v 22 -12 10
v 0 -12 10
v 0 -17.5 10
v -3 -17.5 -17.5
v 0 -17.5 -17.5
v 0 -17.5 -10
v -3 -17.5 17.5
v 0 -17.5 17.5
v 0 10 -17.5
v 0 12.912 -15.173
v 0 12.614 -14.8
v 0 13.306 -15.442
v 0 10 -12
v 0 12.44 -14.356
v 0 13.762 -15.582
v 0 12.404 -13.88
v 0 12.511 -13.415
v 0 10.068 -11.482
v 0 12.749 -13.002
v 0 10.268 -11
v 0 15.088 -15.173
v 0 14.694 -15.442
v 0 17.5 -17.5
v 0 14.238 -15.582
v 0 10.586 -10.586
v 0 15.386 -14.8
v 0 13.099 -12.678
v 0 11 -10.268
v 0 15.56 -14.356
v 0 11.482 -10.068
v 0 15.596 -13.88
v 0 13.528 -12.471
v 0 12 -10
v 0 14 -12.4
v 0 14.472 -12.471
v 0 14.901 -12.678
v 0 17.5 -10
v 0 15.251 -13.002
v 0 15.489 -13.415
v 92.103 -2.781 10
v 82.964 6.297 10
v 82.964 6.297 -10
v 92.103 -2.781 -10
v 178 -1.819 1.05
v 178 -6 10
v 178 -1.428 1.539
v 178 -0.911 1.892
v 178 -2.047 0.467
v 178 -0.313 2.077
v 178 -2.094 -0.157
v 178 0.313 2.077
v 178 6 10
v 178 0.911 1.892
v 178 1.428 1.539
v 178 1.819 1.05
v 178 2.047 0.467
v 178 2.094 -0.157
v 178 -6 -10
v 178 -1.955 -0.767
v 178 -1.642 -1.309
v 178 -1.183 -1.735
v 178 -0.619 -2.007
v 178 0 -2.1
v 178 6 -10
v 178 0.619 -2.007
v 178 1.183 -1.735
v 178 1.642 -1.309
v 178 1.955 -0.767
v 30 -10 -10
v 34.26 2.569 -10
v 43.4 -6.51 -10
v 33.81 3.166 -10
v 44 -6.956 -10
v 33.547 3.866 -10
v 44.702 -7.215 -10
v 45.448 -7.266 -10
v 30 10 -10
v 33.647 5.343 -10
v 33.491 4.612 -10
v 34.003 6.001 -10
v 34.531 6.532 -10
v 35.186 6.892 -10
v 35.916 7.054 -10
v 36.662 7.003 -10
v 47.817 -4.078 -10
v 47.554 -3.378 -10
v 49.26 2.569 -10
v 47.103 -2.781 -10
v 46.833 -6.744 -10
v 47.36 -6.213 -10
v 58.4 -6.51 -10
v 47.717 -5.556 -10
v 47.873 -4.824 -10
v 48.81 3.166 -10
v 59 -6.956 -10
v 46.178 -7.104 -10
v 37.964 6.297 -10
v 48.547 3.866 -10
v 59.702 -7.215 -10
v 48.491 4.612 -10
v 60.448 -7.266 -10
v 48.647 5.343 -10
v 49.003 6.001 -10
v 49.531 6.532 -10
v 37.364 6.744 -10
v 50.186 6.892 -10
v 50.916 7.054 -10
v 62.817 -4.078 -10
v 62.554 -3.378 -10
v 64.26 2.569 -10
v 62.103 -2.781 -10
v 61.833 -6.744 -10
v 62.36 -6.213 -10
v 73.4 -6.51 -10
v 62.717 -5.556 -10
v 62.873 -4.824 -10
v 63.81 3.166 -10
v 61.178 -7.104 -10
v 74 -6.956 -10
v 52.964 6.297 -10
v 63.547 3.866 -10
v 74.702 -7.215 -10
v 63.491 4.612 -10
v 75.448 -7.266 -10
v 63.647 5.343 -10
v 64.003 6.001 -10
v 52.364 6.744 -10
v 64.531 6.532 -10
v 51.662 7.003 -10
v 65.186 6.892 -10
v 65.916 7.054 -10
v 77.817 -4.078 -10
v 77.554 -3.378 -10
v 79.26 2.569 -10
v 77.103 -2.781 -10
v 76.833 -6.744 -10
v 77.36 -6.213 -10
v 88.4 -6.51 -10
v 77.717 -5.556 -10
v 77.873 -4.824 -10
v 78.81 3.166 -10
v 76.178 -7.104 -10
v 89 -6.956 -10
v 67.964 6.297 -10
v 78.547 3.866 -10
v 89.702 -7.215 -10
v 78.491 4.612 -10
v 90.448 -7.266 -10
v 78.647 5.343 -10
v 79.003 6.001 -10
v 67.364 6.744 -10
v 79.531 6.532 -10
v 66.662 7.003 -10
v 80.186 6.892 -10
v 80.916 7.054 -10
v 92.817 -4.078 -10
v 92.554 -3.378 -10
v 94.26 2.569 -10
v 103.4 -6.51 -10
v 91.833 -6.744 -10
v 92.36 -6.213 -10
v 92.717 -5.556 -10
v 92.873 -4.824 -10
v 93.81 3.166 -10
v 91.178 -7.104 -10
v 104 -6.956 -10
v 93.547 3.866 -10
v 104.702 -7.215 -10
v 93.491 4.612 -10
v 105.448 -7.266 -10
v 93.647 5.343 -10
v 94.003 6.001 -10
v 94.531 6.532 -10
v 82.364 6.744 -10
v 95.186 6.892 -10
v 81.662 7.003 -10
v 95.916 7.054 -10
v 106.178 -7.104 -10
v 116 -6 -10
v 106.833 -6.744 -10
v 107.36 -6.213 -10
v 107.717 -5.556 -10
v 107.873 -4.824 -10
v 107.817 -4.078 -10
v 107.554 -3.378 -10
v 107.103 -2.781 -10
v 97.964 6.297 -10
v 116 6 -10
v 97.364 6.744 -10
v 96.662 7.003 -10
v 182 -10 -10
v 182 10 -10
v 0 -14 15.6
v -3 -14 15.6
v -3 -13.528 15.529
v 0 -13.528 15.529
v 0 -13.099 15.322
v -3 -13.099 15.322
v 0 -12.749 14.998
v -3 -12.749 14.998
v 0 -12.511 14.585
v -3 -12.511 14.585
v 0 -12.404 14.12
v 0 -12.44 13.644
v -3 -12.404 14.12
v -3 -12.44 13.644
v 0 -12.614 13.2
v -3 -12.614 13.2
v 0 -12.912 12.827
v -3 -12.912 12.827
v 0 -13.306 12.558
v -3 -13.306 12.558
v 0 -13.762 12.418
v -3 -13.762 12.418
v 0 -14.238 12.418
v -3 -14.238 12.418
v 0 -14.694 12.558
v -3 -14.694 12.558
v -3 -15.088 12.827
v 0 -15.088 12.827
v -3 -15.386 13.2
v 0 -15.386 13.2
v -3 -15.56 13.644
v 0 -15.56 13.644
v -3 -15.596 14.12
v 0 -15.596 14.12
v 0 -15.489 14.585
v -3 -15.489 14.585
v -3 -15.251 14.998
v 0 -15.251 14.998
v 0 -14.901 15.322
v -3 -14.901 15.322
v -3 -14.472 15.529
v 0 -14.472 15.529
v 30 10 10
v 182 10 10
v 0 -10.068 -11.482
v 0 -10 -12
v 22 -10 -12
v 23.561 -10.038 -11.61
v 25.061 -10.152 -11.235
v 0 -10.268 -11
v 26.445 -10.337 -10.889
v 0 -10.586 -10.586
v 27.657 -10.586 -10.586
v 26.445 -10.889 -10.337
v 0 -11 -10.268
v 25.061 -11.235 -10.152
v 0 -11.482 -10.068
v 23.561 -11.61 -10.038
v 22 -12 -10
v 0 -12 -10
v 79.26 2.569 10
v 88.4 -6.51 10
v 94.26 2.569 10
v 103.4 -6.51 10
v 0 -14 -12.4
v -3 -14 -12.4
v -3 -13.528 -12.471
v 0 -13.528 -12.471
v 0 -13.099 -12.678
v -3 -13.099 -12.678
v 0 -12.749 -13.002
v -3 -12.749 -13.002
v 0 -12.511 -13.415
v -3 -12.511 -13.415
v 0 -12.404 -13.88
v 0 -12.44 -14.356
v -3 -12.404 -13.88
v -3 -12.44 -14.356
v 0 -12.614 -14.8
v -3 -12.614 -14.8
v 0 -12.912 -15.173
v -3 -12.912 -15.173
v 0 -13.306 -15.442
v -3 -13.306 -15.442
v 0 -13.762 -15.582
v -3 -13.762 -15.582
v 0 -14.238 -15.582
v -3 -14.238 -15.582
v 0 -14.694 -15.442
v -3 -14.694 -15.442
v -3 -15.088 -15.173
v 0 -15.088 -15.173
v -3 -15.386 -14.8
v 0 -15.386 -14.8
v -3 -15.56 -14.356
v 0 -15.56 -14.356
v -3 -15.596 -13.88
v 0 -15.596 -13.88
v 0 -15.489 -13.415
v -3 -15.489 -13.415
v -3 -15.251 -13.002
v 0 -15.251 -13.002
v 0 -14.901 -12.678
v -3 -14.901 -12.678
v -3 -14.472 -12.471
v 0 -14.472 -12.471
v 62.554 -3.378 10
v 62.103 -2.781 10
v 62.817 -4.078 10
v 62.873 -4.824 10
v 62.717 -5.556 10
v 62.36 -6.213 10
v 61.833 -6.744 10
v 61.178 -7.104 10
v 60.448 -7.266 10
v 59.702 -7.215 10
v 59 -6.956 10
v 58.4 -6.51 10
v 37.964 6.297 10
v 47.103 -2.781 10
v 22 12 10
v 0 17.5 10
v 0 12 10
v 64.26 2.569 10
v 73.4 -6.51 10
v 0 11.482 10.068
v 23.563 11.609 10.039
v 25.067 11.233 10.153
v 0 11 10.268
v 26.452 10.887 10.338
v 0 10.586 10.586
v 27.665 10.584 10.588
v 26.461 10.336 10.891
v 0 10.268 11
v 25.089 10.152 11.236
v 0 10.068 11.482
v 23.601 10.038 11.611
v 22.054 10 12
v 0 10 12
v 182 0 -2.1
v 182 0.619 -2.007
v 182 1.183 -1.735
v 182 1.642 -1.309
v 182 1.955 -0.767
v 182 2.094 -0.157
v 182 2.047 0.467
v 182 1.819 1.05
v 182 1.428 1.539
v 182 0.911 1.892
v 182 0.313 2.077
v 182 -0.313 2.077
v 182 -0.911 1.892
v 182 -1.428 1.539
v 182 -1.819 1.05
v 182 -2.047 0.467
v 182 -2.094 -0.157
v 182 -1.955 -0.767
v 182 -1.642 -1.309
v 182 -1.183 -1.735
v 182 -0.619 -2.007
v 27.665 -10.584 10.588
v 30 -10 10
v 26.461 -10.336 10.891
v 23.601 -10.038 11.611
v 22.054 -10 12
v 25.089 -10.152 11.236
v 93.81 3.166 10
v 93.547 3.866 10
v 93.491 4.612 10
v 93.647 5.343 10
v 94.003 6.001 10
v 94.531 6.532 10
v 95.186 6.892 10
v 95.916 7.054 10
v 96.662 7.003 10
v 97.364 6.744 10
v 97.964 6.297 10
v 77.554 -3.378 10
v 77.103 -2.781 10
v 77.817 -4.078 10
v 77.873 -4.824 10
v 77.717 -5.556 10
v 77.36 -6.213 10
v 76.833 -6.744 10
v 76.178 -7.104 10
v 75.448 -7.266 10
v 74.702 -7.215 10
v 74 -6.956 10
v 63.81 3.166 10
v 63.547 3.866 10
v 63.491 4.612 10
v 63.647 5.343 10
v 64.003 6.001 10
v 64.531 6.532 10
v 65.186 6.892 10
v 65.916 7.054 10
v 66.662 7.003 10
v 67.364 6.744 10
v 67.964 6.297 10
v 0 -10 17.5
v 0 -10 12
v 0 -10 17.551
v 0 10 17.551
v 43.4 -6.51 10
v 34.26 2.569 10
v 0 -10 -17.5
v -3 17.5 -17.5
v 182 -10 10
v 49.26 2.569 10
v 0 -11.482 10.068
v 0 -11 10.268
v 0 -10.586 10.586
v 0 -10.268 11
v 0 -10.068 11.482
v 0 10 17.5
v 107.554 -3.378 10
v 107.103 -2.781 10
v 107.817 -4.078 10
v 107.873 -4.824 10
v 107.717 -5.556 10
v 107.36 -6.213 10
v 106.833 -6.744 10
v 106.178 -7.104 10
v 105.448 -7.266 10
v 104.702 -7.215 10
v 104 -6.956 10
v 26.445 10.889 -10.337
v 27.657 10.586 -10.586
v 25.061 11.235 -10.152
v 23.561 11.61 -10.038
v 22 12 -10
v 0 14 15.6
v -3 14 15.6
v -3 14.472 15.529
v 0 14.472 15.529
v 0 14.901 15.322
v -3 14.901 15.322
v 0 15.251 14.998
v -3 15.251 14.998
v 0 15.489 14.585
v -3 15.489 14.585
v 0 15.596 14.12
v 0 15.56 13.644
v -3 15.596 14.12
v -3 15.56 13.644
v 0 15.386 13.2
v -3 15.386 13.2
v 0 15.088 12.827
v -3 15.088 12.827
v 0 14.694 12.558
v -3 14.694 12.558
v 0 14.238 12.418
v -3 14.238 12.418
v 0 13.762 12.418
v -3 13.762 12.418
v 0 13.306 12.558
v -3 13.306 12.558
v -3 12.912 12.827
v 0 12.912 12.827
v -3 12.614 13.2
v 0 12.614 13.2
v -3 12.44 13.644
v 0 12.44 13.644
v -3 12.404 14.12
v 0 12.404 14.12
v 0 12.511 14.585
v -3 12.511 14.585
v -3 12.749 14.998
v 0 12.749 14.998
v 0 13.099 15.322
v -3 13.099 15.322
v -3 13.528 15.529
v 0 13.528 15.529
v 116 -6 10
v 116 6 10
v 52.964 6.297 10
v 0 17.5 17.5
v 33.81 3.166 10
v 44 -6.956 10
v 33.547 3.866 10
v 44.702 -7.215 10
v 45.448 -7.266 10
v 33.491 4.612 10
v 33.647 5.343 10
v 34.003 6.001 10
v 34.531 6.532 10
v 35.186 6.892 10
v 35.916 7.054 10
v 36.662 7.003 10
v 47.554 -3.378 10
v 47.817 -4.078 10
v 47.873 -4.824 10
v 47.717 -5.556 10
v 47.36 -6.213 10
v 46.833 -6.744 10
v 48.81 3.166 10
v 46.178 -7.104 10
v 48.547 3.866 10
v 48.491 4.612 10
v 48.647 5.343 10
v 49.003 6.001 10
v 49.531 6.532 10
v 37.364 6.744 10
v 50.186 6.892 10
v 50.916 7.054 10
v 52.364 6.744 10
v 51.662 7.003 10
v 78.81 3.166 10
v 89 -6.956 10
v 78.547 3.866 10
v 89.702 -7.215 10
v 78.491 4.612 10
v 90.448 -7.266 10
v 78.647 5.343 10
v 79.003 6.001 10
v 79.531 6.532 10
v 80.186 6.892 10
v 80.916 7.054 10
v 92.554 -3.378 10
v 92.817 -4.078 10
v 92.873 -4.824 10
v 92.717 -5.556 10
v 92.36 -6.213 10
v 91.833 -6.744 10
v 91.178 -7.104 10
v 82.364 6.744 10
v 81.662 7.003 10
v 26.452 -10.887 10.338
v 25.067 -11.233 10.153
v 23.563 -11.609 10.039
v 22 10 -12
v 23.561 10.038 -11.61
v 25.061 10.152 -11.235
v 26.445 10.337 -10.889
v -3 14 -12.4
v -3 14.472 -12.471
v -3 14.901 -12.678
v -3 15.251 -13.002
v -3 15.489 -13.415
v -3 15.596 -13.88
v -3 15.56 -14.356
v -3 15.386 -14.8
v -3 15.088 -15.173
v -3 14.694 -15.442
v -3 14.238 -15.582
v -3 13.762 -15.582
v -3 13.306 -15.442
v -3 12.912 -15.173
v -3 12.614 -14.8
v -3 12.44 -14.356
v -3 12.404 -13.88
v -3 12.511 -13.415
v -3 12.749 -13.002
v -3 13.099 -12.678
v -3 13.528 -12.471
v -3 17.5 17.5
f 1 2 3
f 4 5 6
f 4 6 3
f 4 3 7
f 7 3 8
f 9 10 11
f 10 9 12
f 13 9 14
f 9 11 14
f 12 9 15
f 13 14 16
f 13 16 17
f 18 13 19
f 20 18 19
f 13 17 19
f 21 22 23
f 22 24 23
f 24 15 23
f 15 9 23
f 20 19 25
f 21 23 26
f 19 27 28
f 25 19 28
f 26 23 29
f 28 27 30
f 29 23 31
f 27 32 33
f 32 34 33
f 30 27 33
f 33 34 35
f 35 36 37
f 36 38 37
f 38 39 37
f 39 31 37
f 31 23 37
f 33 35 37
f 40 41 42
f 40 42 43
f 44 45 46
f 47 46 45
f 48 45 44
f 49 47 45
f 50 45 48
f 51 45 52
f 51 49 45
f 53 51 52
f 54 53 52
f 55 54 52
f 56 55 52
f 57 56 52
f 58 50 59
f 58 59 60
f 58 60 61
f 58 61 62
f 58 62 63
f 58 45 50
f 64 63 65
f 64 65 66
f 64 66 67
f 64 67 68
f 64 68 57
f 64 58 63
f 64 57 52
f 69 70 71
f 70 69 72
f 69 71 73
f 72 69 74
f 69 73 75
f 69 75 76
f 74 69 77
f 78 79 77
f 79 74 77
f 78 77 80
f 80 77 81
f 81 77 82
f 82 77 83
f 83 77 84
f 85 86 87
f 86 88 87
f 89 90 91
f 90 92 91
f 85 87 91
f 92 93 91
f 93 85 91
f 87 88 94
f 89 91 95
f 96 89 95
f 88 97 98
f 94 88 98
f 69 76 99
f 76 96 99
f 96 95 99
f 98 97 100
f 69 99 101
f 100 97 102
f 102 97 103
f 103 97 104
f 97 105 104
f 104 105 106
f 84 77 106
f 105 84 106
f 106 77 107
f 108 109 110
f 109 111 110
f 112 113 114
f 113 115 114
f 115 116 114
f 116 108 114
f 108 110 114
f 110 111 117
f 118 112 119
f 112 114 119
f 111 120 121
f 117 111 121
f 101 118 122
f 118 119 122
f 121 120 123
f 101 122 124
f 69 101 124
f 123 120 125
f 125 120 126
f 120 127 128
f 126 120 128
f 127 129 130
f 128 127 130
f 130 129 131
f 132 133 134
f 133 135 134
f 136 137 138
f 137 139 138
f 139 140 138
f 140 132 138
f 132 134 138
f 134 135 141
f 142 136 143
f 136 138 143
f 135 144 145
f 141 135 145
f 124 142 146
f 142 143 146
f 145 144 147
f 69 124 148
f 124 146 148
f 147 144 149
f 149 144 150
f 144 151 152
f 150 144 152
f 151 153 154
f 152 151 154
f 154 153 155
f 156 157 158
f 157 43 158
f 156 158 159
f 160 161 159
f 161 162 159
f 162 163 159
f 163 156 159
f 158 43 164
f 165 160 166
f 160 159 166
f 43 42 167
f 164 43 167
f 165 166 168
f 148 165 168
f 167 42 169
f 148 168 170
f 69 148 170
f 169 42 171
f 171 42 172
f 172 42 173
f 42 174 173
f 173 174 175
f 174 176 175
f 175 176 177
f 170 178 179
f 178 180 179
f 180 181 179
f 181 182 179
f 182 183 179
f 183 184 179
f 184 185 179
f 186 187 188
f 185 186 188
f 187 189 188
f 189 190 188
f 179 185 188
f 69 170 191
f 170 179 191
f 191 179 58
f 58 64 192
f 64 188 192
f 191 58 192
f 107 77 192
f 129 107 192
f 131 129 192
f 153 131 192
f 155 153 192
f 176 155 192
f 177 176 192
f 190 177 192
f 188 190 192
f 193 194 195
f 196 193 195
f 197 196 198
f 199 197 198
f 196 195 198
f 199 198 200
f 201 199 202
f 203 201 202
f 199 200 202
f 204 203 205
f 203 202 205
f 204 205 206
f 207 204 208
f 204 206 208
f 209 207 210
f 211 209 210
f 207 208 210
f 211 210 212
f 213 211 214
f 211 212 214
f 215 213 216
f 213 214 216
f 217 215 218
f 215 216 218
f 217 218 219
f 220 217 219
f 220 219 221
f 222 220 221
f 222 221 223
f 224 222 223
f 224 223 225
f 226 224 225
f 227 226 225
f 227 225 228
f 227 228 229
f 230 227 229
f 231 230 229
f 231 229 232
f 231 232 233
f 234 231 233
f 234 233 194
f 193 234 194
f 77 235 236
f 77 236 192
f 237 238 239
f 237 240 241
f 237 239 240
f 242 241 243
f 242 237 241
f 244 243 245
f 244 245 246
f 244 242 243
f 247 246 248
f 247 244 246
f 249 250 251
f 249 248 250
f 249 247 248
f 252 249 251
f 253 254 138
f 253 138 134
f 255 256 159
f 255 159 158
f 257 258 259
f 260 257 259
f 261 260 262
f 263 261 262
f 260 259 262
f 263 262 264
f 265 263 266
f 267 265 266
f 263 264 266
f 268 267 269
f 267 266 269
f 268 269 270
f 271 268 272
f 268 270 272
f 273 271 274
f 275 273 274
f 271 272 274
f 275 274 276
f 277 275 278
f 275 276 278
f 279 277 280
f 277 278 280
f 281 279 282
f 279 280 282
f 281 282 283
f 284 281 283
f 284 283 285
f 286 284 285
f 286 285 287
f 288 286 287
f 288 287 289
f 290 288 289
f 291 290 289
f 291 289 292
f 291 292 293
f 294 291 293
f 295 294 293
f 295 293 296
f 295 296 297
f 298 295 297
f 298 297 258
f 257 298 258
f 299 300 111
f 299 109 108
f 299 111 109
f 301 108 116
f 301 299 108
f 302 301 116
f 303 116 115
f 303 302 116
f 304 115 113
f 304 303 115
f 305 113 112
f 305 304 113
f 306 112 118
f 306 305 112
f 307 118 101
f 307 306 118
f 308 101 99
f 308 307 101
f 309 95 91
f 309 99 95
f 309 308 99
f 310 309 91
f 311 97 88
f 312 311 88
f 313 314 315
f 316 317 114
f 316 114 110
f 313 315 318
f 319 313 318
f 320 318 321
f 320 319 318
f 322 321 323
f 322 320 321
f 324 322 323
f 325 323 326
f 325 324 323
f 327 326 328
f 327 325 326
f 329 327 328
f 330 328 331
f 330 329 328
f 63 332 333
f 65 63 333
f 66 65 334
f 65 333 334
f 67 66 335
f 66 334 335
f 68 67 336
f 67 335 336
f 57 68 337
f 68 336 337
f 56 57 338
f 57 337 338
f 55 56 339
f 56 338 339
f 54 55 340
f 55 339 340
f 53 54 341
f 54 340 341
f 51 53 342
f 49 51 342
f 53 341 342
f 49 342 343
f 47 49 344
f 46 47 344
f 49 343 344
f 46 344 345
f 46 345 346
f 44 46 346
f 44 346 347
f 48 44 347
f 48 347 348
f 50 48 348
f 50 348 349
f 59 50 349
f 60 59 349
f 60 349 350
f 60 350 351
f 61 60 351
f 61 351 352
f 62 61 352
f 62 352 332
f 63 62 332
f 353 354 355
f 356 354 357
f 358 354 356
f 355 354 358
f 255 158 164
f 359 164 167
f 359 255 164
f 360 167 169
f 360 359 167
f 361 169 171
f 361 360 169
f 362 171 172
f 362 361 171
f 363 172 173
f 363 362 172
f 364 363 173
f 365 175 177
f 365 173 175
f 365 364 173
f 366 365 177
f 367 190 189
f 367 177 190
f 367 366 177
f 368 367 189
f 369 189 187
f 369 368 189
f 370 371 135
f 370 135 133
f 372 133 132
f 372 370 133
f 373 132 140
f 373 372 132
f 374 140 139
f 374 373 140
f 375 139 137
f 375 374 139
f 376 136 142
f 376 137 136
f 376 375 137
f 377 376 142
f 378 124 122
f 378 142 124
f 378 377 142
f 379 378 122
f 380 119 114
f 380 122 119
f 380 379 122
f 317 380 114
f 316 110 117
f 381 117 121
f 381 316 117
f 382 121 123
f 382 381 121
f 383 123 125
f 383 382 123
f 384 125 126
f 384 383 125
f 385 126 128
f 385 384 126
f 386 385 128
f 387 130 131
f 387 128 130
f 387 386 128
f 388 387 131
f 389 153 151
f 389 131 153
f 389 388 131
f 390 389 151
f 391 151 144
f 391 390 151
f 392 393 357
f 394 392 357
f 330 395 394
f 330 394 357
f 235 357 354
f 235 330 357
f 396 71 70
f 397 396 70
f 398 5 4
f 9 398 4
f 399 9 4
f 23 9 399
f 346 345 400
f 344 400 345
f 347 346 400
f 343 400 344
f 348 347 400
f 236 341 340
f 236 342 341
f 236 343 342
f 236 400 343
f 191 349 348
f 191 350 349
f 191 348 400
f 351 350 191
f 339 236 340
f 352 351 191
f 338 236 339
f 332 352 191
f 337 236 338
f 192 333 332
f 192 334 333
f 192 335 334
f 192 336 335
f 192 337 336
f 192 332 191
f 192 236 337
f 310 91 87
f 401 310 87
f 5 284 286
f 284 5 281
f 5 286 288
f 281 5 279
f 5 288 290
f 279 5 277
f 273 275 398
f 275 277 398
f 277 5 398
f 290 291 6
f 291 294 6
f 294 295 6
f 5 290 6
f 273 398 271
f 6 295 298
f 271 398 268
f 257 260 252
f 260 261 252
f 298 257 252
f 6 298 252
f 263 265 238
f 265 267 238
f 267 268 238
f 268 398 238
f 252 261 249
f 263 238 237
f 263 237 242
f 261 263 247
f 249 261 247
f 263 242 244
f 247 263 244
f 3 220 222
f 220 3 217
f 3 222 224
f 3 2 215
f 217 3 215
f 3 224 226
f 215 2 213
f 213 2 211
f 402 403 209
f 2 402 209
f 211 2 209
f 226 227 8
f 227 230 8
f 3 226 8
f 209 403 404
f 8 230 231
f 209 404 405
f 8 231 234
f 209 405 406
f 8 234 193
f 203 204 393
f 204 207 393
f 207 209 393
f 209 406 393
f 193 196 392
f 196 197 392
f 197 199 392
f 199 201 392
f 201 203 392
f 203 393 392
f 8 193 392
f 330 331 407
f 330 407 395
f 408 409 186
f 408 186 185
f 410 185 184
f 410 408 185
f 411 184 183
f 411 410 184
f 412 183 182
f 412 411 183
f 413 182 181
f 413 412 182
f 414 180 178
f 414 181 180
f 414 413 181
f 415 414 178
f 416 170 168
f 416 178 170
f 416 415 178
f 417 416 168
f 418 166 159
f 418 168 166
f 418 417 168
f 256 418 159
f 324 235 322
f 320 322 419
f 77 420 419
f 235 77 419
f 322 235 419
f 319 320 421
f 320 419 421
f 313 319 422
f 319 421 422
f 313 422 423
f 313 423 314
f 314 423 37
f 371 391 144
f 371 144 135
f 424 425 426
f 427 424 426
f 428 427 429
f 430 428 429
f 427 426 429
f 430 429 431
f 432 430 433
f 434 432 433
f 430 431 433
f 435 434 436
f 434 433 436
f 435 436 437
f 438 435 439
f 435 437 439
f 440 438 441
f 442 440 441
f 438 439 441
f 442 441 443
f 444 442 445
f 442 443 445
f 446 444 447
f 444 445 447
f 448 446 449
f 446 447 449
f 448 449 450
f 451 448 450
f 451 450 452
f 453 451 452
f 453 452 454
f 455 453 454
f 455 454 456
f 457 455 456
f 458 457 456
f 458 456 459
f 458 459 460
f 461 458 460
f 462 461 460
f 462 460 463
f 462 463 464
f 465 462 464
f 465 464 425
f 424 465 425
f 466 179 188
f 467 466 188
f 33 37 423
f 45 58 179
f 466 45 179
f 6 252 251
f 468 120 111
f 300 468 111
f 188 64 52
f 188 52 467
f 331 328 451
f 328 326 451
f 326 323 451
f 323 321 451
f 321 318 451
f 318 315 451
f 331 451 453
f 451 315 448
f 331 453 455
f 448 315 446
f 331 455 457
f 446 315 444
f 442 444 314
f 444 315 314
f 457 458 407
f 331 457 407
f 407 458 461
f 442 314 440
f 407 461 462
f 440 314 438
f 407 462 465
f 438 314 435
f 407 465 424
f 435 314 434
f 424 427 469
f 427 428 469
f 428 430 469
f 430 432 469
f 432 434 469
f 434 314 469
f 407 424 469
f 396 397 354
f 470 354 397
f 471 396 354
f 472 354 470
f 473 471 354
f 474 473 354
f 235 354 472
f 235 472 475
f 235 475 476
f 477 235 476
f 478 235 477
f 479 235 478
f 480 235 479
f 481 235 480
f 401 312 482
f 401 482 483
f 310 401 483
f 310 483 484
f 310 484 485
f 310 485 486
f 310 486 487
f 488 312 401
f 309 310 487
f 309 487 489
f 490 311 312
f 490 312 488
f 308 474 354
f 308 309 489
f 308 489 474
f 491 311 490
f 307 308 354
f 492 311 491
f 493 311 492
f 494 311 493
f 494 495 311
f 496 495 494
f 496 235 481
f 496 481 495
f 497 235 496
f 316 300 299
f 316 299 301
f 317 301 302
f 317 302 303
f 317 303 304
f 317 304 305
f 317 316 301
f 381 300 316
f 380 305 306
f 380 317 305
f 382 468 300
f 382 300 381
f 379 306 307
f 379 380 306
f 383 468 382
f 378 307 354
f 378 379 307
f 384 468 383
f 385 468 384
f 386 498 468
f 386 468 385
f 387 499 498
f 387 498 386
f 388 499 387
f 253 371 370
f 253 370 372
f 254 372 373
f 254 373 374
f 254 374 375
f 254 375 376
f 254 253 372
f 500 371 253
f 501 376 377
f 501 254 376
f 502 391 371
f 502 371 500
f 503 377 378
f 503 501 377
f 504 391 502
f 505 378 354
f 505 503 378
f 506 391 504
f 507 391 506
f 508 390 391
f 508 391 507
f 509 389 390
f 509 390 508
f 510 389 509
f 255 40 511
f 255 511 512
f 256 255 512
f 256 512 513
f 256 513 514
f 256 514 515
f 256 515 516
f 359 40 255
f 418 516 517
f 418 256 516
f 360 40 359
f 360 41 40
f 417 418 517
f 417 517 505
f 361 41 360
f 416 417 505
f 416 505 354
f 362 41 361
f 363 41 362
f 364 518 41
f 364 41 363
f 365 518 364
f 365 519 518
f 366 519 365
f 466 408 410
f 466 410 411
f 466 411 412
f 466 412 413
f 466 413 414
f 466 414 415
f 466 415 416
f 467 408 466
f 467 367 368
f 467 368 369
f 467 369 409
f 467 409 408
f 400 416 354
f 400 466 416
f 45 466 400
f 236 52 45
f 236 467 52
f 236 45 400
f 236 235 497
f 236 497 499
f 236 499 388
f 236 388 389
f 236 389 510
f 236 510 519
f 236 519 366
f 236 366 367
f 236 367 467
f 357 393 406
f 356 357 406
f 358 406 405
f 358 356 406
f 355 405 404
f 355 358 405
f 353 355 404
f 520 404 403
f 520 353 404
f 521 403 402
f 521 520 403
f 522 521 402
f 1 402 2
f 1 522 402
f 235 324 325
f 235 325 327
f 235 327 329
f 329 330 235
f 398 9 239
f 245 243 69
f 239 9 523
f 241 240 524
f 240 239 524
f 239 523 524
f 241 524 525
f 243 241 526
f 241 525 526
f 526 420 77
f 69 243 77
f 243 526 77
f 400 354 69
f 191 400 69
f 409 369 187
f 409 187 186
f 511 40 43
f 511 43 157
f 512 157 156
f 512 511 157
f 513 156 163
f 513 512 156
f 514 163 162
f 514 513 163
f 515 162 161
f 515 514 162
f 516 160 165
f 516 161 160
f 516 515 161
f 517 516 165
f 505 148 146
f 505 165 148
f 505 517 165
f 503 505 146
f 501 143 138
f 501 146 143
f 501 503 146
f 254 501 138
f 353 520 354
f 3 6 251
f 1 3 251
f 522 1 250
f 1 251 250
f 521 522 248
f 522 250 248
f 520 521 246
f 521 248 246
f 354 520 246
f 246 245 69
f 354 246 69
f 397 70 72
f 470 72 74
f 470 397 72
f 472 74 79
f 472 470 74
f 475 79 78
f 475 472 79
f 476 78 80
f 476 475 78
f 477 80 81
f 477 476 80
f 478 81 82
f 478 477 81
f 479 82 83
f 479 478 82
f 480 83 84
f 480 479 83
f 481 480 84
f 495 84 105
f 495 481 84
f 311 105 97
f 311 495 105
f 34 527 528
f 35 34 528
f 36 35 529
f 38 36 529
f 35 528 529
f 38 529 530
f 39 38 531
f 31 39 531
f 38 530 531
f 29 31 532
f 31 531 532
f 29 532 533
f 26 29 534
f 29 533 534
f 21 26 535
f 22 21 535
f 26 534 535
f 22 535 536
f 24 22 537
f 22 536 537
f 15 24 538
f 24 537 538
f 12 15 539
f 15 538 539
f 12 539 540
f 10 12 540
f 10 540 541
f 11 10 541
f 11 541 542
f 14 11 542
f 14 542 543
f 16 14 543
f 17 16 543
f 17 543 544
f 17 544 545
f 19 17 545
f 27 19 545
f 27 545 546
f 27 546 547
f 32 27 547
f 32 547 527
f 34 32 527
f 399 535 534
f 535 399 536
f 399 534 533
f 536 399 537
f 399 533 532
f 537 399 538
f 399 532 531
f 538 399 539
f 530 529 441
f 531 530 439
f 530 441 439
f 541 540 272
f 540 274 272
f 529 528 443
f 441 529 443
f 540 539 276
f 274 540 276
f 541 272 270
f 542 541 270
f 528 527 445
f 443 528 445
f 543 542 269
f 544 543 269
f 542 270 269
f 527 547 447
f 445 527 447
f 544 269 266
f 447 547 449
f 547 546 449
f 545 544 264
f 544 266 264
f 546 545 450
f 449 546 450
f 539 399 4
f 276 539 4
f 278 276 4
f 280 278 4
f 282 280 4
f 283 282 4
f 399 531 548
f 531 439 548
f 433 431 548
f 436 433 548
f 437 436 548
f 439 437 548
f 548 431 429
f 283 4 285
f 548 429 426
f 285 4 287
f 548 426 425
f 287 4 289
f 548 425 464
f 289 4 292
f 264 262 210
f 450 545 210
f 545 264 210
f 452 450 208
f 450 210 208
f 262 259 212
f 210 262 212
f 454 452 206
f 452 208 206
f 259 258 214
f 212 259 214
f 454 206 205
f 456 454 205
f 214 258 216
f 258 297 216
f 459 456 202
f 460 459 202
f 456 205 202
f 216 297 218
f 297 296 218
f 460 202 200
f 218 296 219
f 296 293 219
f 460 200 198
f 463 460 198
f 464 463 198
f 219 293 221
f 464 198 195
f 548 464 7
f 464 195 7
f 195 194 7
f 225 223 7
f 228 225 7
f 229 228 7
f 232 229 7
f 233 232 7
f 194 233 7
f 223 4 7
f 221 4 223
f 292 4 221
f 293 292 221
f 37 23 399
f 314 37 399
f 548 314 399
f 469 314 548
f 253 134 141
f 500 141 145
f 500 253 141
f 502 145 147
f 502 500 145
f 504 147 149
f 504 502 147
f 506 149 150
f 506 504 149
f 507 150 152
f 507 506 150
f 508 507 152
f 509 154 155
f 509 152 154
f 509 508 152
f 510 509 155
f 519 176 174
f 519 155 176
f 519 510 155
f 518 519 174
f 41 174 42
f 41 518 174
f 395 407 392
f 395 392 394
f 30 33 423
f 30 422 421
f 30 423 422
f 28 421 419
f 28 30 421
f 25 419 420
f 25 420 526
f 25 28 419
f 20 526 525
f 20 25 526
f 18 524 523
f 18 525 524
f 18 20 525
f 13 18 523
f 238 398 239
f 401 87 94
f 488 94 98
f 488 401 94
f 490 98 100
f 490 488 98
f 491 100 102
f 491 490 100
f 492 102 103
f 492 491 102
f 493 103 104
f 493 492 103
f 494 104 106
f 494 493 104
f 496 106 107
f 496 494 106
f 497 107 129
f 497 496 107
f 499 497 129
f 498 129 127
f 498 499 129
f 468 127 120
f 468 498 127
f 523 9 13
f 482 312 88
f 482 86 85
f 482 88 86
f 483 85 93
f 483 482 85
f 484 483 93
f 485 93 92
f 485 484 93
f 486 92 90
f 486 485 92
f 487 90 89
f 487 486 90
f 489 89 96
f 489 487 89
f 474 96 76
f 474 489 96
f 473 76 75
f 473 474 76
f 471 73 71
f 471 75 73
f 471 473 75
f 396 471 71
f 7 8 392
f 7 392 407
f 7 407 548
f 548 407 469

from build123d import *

# Parameters (mm, degrees)
SKETCH_1_W          = 20
SKETCH_1_H          = 20
EXTRUDE_1_DEPTH     = 182
SKETCH_3_W          = 35
SKETCH_3_H          = 35
EXTRUDE_2_DEPTH     = 3
SKETCH_4_R          = 2.1
CUT_EXTRUDE_2_DEPTH = 23
CUT_EXTRUDE_3_REACH = 188.648
SKETCH_5_R          = 1.6
EXTRUDE_3_DEPTH     = 20
EXTRUDE_4_DEPTH     = 20
FILLET_1_R          = 2
CUT_EXTRUDE_4_REACH = 186.903
SKETCH_8_W          = 62
SKETCH_8_H          = 12
CUT_EXTRUDE_6_REACH = 186.896


with BuildPart() as part:
    # 草图1 → 凸台-拉伸1 (new body)
    with BuildSketch(Plane(origin=(0, 0, 0), x_dir=(0, 0, -1), z_dir=(1, 0, 0))):
        Rectangle(SKETCH_1_W, SKETCH_1_H)
    extrude(amount=EXTRUDE_1_DEPTH)

    # 草图3 → 凸台-拉伸2 (add)
    with BuildSketch(Plane.ZY):
        Rectangle(SKETCH_3_W, SKETCH_3_H)
    extrude(amount=EXTRUDE_2_DEPTH)

    # 草图4 → 切除-拉伸2 (cut)
    with BuildSketch(Plane(origin=(182, 0, 0), x_dir=(0, 0, -1), z_dir=(1, 0, 0))):
        Circle(SKETCH_4_R)
    extrude(amount=-CUT_EXTRUDE_2_DEPTH, mode=Mode.SUBTRACT)

    # 草图5 → 切除-拉伸3 (cut, up to next)
    with BuildSketch(Plane.ZY.offset(3), mode=Mode.PRIVATE) as cut_extrude_3_sk1:
        with Locations((-14, 14)):
            Circle(SKETCH_5_R)
    cut_extrude_3_tool1 = extrude(cut_extrude_3_sk1.sketch, amount=-CUT_EXTRUDE_3_REACH, mode=Mode.PRIVATE) & part.part
    # 草图5 → 切除-拉伸3 (cut, up to next)
    with BuildSketch(Plane.ZY.offset(3), mode=Mode.PRIVATE) as cut_extrude_3_sk2:
        with Locations((14, 14)):
            Circle(SKETCH_5_R)
    cut_extrude_3_tool2 = extrude(cut_extrude_3_sk2.sketch, amount=-CUT_EXTRUDE_3_REACH, mode=Mode.PRIVATE) & part.part
    # 草图5 → 切除-拉伸3 (cut, up to next)
    with BuildSketch(Plane.ZY.offset(3), mode=Mode.PRIVATE) as cut_extrude_3_sk3:
        with Locations((-14, -14)):
            Circle(SKETCH_5_R)
    cut_extrude_3_tool3 = extrude(cut_extrude_3_sk3.sketch, amount=-CUT_EXTRUDE_3_REACH, mode=Mode.PRIVATE) & part.part
    # 草图5 → 切除-拉伸3 (cut, up to next)
    with BuildSketch(Plane.ZY.offset(3), mode=Mode.PRIVATE) as cut_extrude_3_sk4:
        with Locations((14, -14)):
            Circle(SKETCH_5_R)
    cut_extrude_3_tool4 = extrude(cut_extrude_3_sk4.sketch, amount=-CUT_EXTRUDE_3_REACH, mode=Mode.PRIVATE) & part.part
    add(cut_extrude_3_tool1.solids().sort_by_distance((-3, 14, -14))[0], mode=Mode.SUBTRACT)
    add(cut_extrude_3_tool2.solids().sort_by_distance((-3, 14, 14))[0], mode=Mode.SUBTRACT)
    add(cut_extrude_3_tool3.solids().sort_by_distance((-3, -14, -14))[0], mode=Mode.SUBTRACT)
    add(cut_extrude_3_tool4.solids().sort_by_distance((-3, -14, 14))[0], mode=Mode.SUBTRACT)

    # 草图6 → 凸台-拉伸3 (add)
    with BuildSketch(Plane(origin=(0, 0, -10), x_dir=(-1, 0, 0), z_dir=(0, 0, -1))):
        Polygon((-30, 10), (0, 17.5), (0, 10), align=None)
        Polygon((0, -10), (-30, -10), (0, -17.5), align=None)
    extrude(amount=-EXTRUDE_3_DEPTH)

    # 草图7 → 凸台-拉伸4 (add)
    with BuildSketch(Plane(origin=(0, 10, 0), x_dir=(1, 0, 0), z_dir=(0, 1, 0))):
        Polygon((0, 10), (30, 10), (0, 17.5), align=None)
        Polygon((30, -10), (0, -10), (0, -17.550639808), align=None)
    extrude(amount=-EXTRUDE_4_DEPTH)

    # 圆角1
    # the kernel refuses this fillet: 2 mm, written as the material it adds along each edge
    with BuildSketch(Plane(origin=(-5, 10, -10), x_dir=(0, 0, -1), z_dir=(1, 0, 0))) as fillet_1_piece_1_section:
        with BuildLine():
            CenterArc((FILLET_1_R, FILLET_1_R), FILLET_1_R, 180, 90)
            Line((0, FILLET_1_R), (0, 0))
            Line((0, 0), (FILLET_1_R, 0))
        make_face()
    fillet_1_piece_1 = extrude(amount=40, mode=Mode.PRIVATE)
    fillet_1_piece_1 = split(fillet_1_piece_1, bisect_by=Plane(origin=(14.470095562, 13.882476109, -10.438694278), z_dir=(-0.24253562503633314, -0.9701425001453319, 0)), keep=Keep.TOP, mode=Mode.PRIVATE)
    fillet_1_piece_1 = split(fillet_1_piece_1, bisect_by=Plane(origin=(-3, 10.438694278, -10.438694278), z_dir=(1, 0, 0)), keep=Keep.TOP, mode=Mode.PRIVATE)
    fillet_1_piece_1 = split(fillet_1_piece_1, bisect_by=Plane(origin=(14.470095562, 10.438694278, -13.882476109), z_dir=(-0.24253562503633308, 0, 0.9701425001453319)), keep=Keep.TOP, mode=Mode.PRIVATE)
    add(fillet_1_piece_1)
    with BuildSketch(Plane(origin=(0, -10, -10), x_dir=(0, -1, 0), z_dir=(1, 0, 0))) as fillet_1_piece_2_section:
        with BuildLine():
            CenterArc((FILLET_1_R, FILLET_1_R), FILLET_1_R, 180, 90)
            Line((0, FILLET_1_R), (0, 0))
            Line((0, 0), (FILLET_1_R, 0))
        make_face()
    fillet_1_piece_2 = extrude(amount=35, mode=Mode.PRIVATE)
    fillet_1_piece_2 = split(fillet_1_piece_2, bisect_by=Plane(origin=(14.470095562, -10.438694278, -13.882476109), z_dir=(-0.24253562503633308, 0, 0.9701425001453319)), keep=Keep.TOP, mode=Mode.PRIVATE)
    fillet_1_piece_2 = split(fillet_1_piece_2, bisect_by=Plane(origin=(14.470095562, -13.882476109, -10.438694278), z_dir=(-0.24253562503633314, 0.9701425001453319, 0)), keep=Keep.TOP, mode=Mode.PRIVATE)
    add(fillet_1_piece_2)
    with BuildSketch(Plane(origin=(35, 10, 10), x_dir=(0, 1, 0), z_dir=(-1, 0, 0))) as fillet_1_piece_3_section:
        with BuildLine():
            CenterArc((FILLET_1_R, -FILLET_1_R), FILLET_1_R, 90, 90)
            Line((0, -FILLET_1_R), (0, 0))
            Line((0, 0), (FILLET_1_R, 0))
        make_face()
    fillet_1_piece_3 = extrude(amount=40, mode=Mode.PRIVATE)
    fillet_1_piece_3 = split(fillet_1_piece_3, bisect_by=Plane(origin=(14.474382617, 13.881404346, 10.438850692), z_dir=(-0.24253562503633314, -0.9701425001453319, 0)), keep=Keep.TOP, mode=Mode.PRIVATE)
    fillet_1_piece_3 = split(fillet_1_piece_3, bisect_by=Plane(origin=(-3, 10.438597443, 10.438850692), z_dir=(1, 0, 0)), keep=Keep.TOP, mode=Mode.PRIVATE)
    fillet_1_piece_3 = split(fillet_1_piece_3, bisect_by=Plane(origin=(14.485990983, 10.438597443, 13.904689802), z_dir=(-0.24407597060240918, 0, -0.969756113966028)), keep=Keep.TOP, mode=Mode.PRIVATE)
    add(fillet_1_piece_3)
    with BuildSketch(Plane(origin=(35, -10, 10), x_dir=(0, 0, 1), z_dir=(-1, 0, 0))) as fillet_1_piece_4_section:
        with BuildLine():
            CenterArc((FILLET_1_R, -FILLET_1_R), FILLET_1_R, 90, 90)
            Line((0, -FILLET_1_R), (0, 0))
            Line((0, 0), (FILLET_1_R, 0))
        make_face()
    fillet_1_piece_4 = extrude(amount=35, mode=Mode.PRIVATE)
    fillet_1_piece_4 = split(fillet_1_piece_4, bisect_by=Plane(origin=(14.474382617, -13.881404346, 10.438850692), z_dir=(-0.24253562503633314, 0.9701425001453319, 0)), keep=Keep.TOP, mode=Mode.PRIVATE)
    fillet_1_piece_4 = split(fillet_1_piece_4, bisect_by=Plane(origin=(14.485990983, -10.438597443, 13.904689802), z_dir=(-0.24407597060240918, 0, -0.969756113966028)), keep=Keep.TOP, mode=Mode.PRIVATE)
    add(fillet_1_piece_4)

    # 草图8 → 切除-拉伸4 (cut, up to next)
    with BuildSketch(Plane(origin=(0, 0, -10), x_dir=(-1, 0, 0), z_dir=(0, 0, -1)), mode=Mode.PRIVATE) as cut_extrude_4_sk1:
        with Locations((-147, 0)):
            Rectangle(SKETCH_8_W, SKETCH_8_H)
    cut_extrude_4_tool1 = extrude(cut_extrude_4_sk1.sketch, amount=-CUT_EXTRUDE_4_REACH, mode=Mode.PRIVATE) & part.part
    add(cut_extrude_4_tool1.solids().sort_by_distance((147, 0, -10))[0], mode=Mode.SUBTRACT)

    # 草图9 → 切除-拉伸6 (cut, up to next)
    with BuildSketch(Plane.XY.offset(10), mode=Mode.PRIVATE) as cut_extrude_6_sk1:
        with BuildLine():
            Line((97.964235065, 6.297490727), (107.103469291, -2.781172596))
            ThreePointArc((107.103469291, -2.781172596), (107.115824812, -6.497340056), (103.399657352, -6.509695577))
            Line((103.399657352, -6.509695577), (94.260423126, 2.568967746))
            ThreePointArc((94.260423126, 2.568967746), (94.248067605, 6.285135206), (97.964235065, 6.297490727))
        make_face()
    cut_extrude_6_tool1 = extrude(cut_extrude_6_sk1.sketch, amount=-CUT_EXTRUDE_6_REACH, mode=Mode.PRIVATE) & part.part
    # 草图9 → 切除-拉伸6 (cut, up to next)
    with BuildSketch(Plane.XY.offset(10), mode=Mode.PRIVATE) as cut_extrude_6_sk2:
        with BuildLine():
            Line((82.964235065, 6.297490727), (92.103469291, -2.781172596))
            ThreePointArc((92.103469291, -2.781172596), (92.115824812, -6.497340056), (88.399657352, -6.509695577))
            Line((88.399657352, -6.509695577), (79.260423126, 2.568967746))
            ThreePointArc((79.260423126, 2.568967746), (79.248067605, 6.285135206), (82.964235065, 6.297490727))
        make_face()
    cut_extrude_6_tool2 = extrude(cut_extrude_6_sk2.sketch, amount=-CUT_EXTRUDE_6_REACH, mode=Mode.PRIVATE) & part.part
    # 草图9 → 切除-拉伸6 (cut, up to next)
    with BuildSketch(Plane.XY.offset(10), mode=Mode.PRIVATE) as cut_extrude_6_sk3:
        with BuildLine():
            Line((67.964235065, 6.297490727), (77.103469291, -2.781172596))
            ThreePointArc((77.103469291, -2.781172596), (77.115824812, -6.497340056), (73.399657352, -6.509695577))
            Line((73.399657352, -6.509695577), (64.260423126, 2.568967746))
            ThreePointArc((64.260423126, 2.568967746), (64.248067605, 6.285135206), (67.964235065, 6.297490727))
        make_face()
    cut_extrude_6_tool3 = extrude(cut_extrude_6_sk3.sketch, amount=-CUT_EXTRUDE_6_REACH, mode=Mode.PRIVATE) & part.part
    # 草图9 → 切除-拉伸6 (cut, up to next)
    with BuildSketch(Plane.XY.offset(10), mode=Mode.PRIVATE) as cut_extrude_6_sk4:
        with BuildLine():
            Line((52.964235065, 6.297490727), (62.103469291, -2.781172596))
            ThreePointArc((62.103469291, -2.781172596), (62.115824812, -6.497340056), (58.399657352, -6.509695577))
            Line((58.399657352, -6.509695577), (49.260423126, 2.568967746))
            ThreePointArc((49.260423126, 2.568967746), (49.248067605, 6.285135206), (52.964235065, 6.297490727))
        make_face()
    cut_extrude_6_tool4 = extrude(cut_extrude_6_sk4.sketch, amount=-CUT_EXTRUDE_6_REACH, mode=Mode.PRIVATE) & part.part
    # 草图9 → 切除-拉伸6 (cut, up to next)
    with BuildSketch(Plane.XY.offset(10), mode=Mode.PRIVATE) as cut_extrude_6_sk5:
        with BuildLine():
            Line((37.964235065, 6.297490727), (47.103469291, -2.781172596))
            ThreePointArc((47.103469291, -2.781172596), (47.115824812, -6.497340056), (43.399657352, -6.509695577))
            Line((43.399657352, -6.509695577), (34.260423126, 2.568967746))
            ThreePointArc((34.260423126, 2.568967746), (34.248067605, 6.285135206), (37.964235065, 6.297490727))
        make_face()
    cut_extrude_6_tool5 = extrude(cut_extrude_6_sk5.sketch, amount=-CUT_EXTRUDE_6_REACH, mode=Mode.PRIVATE) & part.part
    add(cut_extrude_6_tool1.solids().sort_by_distance((100.681946, -0.106102, 10))[0], mode=Mode.SUBTRACT)
    add(cut_extrude_6_tool2.solids().sort_by_distance((85.681946, -0.106102, 10))[0], mode=Mode.SUBTRACT)
    add(cut_extrude_6_tool3.solids().sort_by_distance((70.681946, -0.106102, 10))[0], mode=Mode.SUBTRACT)
    add(cut_extrude_6_tool4.solids().sort_by_distance((55.681946, -0.106102, 10))[0], mode=Mode.SUBTRACT)
    add(cut_extrude_6_tool5.solids().sort_by_distance((40.681946, -0.106102, 10))[0], mode=Mode.SUBTRACT)


solid = part.part
